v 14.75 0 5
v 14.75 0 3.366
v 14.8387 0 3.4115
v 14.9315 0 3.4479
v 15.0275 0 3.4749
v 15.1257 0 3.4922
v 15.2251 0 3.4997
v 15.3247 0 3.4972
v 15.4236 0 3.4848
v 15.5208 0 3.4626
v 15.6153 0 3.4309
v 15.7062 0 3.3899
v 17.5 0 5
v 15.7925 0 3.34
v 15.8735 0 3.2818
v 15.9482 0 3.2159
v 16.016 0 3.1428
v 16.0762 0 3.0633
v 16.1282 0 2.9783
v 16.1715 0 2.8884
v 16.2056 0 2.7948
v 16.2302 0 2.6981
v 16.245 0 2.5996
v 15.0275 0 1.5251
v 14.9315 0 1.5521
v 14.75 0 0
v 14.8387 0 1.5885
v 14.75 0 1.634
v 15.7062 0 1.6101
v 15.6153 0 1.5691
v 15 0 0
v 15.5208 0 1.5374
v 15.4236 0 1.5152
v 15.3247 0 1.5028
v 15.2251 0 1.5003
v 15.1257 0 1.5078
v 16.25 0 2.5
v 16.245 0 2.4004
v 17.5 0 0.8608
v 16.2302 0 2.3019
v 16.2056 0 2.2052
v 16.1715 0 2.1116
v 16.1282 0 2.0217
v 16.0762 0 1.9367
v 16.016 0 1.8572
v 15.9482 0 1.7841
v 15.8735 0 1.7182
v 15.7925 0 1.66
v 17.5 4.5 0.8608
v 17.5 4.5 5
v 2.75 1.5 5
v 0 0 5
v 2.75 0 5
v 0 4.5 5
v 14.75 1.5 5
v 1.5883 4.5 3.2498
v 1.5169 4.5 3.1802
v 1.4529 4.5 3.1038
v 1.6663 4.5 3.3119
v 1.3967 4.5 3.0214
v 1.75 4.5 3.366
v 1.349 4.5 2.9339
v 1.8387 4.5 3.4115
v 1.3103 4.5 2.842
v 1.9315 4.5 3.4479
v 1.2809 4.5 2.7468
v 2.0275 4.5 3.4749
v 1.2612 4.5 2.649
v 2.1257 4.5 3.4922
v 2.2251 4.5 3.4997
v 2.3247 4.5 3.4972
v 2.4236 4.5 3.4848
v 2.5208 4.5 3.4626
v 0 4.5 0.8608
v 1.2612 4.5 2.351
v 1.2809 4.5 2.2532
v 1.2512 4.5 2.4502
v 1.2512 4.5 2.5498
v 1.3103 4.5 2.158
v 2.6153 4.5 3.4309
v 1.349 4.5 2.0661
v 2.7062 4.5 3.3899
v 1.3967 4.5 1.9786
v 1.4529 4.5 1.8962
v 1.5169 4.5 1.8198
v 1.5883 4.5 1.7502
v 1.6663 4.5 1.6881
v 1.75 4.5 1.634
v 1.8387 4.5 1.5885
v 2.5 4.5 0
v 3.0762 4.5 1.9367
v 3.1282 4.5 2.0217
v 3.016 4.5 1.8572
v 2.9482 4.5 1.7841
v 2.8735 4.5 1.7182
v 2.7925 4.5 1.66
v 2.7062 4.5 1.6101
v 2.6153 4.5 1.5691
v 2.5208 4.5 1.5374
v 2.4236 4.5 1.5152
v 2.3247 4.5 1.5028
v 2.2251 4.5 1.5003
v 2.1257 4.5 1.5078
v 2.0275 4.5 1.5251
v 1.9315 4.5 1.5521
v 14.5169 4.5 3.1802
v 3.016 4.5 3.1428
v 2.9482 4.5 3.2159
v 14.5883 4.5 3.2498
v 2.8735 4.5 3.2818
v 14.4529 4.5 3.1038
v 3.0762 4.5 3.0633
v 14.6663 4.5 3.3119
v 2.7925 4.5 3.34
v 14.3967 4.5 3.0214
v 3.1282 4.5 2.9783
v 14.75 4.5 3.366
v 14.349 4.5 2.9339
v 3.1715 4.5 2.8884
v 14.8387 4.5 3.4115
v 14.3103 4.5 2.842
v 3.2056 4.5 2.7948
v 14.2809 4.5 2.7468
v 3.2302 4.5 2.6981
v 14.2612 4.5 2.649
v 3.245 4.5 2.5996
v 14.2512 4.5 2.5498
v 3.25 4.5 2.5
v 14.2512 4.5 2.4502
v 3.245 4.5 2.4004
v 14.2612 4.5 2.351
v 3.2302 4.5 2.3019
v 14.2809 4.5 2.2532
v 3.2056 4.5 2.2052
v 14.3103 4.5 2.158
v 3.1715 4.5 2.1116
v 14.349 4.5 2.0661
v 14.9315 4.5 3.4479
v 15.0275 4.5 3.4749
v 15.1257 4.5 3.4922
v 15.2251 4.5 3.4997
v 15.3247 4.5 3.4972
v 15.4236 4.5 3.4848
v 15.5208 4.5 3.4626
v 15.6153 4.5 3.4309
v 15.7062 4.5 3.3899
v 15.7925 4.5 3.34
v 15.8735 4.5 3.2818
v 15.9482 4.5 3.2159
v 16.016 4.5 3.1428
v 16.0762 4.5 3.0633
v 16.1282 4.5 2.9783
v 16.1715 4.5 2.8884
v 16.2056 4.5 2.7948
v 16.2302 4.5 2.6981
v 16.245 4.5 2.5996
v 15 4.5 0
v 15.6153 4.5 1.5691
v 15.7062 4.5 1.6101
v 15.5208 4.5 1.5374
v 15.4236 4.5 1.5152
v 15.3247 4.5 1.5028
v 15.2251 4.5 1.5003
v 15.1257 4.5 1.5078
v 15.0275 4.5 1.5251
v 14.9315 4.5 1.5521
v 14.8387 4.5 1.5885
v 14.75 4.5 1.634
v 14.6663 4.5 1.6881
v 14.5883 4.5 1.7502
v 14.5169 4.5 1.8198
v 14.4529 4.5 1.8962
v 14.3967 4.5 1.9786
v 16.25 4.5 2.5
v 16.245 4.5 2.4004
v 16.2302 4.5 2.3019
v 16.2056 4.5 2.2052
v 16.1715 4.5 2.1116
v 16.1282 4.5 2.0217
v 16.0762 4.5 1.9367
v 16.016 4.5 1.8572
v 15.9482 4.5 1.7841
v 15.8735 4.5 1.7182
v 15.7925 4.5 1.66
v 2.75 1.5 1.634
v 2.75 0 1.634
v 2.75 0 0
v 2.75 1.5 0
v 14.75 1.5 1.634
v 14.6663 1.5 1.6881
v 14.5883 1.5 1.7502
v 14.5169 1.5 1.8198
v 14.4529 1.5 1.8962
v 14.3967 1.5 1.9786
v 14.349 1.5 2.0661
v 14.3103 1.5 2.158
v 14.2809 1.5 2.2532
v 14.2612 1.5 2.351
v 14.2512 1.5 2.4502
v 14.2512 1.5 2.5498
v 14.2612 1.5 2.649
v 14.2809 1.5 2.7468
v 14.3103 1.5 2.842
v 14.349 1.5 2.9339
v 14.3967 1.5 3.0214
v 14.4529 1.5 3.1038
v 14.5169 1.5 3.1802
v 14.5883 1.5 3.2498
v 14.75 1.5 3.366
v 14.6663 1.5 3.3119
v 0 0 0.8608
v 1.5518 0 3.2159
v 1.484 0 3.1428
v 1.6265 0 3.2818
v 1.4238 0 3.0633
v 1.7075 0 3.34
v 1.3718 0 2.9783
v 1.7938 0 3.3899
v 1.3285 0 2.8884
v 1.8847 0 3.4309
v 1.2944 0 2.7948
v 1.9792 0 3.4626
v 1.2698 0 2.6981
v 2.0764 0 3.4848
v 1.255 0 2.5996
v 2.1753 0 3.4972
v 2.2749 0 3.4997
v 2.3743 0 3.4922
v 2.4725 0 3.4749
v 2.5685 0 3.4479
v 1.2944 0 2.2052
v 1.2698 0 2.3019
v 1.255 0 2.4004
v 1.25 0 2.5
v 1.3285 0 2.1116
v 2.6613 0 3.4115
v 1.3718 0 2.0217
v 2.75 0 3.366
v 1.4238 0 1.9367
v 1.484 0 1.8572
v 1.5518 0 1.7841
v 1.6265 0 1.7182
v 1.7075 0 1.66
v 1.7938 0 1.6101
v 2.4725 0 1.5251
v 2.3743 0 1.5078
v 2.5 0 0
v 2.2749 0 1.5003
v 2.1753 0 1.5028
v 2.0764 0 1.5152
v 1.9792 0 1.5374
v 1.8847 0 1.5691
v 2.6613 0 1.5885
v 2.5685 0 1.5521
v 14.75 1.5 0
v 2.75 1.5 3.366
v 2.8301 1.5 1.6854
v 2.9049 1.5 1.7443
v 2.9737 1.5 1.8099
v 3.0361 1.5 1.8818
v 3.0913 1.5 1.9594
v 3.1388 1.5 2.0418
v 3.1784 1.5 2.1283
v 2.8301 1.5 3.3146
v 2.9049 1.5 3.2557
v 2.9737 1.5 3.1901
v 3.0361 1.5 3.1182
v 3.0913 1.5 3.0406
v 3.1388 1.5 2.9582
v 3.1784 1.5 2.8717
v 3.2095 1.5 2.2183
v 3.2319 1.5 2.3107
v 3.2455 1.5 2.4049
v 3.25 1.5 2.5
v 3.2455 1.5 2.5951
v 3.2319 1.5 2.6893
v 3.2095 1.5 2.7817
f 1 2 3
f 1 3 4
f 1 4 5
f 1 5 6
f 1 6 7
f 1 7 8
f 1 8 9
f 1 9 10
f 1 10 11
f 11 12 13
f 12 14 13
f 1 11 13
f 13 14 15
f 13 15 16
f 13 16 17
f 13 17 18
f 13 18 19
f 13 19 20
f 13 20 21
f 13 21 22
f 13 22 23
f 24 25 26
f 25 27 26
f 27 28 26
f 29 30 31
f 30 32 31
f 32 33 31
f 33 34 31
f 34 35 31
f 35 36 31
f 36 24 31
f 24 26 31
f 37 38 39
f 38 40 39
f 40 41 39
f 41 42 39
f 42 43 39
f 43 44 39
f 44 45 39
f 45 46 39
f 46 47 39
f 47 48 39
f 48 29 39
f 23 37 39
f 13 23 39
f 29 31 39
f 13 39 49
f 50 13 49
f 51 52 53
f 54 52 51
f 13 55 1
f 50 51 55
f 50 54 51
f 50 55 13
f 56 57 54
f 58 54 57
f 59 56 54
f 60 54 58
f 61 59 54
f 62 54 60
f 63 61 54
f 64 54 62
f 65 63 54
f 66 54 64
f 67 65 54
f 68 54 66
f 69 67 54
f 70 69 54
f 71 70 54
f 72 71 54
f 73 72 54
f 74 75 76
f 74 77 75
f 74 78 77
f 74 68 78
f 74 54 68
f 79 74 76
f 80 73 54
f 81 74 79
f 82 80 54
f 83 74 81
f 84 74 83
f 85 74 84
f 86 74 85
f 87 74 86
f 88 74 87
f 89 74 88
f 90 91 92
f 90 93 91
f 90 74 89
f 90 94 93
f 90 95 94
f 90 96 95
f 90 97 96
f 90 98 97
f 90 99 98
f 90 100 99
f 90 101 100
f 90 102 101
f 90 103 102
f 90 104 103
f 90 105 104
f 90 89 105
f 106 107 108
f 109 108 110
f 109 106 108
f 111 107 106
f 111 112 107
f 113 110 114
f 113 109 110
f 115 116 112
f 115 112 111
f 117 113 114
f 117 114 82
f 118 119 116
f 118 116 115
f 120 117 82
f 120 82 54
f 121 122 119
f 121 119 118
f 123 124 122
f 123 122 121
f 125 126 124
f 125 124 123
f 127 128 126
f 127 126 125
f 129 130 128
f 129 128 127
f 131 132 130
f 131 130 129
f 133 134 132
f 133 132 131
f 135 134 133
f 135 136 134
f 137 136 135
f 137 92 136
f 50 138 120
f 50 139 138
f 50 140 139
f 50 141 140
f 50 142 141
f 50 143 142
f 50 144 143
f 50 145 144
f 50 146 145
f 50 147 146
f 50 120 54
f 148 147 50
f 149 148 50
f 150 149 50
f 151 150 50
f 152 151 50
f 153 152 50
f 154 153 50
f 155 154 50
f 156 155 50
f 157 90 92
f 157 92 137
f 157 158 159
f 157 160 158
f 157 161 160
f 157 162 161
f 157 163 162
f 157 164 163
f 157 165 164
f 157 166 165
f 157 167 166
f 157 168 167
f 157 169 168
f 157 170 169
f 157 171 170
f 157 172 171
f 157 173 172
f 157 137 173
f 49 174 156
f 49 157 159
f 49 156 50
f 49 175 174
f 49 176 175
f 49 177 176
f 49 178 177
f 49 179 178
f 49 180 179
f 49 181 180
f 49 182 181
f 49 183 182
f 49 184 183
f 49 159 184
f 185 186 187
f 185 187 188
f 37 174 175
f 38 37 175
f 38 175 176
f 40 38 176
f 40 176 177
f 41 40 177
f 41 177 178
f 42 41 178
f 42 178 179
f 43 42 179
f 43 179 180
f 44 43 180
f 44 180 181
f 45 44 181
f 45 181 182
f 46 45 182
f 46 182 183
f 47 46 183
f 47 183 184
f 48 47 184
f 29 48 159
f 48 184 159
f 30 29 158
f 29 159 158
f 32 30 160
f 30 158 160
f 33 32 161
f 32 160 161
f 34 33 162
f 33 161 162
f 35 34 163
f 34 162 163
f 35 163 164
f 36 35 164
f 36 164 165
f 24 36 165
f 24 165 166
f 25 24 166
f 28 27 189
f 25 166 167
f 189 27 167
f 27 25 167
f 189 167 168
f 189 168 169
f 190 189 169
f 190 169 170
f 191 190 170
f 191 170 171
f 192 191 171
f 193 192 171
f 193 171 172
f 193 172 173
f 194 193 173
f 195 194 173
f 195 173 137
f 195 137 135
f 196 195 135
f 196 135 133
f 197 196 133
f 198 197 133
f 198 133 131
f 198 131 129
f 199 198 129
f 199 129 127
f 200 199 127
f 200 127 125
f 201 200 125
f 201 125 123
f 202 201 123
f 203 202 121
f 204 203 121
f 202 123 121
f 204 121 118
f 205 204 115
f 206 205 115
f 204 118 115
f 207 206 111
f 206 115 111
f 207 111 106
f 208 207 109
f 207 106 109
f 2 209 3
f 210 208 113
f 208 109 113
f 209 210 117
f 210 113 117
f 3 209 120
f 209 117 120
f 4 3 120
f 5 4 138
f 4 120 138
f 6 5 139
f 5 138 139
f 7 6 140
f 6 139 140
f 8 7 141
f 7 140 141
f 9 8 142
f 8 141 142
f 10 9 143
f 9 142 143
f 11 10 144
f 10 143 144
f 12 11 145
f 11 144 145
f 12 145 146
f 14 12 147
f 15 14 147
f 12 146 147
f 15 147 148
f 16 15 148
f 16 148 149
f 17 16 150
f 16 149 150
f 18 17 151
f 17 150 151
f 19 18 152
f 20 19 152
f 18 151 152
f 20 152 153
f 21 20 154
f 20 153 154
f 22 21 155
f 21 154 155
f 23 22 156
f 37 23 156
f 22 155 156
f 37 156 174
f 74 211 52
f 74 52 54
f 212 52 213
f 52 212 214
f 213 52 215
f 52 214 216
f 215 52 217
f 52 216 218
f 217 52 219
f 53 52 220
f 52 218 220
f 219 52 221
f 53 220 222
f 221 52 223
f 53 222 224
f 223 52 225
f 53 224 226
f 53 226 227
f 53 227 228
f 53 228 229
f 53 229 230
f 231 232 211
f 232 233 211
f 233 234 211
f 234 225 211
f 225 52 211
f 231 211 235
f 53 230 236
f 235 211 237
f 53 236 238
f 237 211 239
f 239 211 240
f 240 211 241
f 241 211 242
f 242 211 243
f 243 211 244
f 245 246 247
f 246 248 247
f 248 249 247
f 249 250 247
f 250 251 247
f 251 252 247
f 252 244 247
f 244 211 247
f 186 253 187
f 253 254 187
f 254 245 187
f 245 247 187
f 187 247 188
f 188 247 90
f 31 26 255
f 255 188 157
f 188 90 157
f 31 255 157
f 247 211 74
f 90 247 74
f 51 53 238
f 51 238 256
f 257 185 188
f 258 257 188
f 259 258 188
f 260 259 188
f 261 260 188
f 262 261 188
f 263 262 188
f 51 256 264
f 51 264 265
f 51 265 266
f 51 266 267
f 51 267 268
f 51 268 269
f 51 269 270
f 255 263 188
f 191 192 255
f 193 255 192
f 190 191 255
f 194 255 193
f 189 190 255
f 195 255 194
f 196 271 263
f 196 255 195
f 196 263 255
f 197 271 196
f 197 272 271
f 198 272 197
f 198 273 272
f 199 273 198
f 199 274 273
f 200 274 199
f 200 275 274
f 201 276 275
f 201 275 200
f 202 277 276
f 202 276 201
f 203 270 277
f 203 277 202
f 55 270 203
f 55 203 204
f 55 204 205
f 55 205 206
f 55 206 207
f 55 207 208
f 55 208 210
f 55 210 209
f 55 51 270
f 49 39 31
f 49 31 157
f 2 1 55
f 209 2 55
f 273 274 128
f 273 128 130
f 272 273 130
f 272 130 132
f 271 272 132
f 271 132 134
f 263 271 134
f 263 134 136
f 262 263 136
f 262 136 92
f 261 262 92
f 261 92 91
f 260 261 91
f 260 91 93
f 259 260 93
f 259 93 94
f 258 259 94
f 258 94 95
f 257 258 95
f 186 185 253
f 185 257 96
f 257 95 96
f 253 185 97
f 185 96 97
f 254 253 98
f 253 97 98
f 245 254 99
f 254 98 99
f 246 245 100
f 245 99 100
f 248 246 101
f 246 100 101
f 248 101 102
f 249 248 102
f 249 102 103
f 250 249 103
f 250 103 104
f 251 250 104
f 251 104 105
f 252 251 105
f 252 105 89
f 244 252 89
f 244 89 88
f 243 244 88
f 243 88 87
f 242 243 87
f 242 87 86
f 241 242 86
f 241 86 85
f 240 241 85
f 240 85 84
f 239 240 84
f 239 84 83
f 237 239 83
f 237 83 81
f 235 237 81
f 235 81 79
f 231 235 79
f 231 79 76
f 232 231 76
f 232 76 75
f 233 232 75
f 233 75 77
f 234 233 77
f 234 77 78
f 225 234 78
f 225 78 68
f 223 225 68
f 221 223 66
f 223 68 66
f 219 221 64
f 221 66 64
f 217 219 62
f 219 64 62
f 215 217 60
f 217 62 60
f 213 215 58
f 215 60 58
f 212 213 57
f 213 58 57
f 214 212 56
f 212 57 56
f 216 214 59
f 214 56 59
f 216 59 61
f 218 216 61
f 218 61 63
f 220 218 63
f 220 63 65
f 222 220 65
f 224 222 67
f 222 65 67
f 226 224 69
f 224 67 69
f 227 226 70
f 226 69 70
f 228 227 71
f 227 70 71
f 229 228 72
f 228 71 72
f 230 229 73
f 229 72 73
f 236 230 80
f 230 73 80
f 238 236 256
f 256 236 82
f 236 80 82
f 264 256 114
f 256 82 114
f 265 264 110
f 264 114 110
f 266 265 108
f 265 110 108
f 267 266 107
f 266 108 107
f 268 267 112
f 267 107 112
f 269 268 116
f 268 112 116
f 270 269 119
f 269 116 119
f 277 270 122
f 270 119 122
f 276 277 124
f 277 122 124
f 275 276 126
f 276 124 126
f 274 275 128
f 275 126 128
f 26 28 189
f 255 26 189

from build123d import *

# Parameters (mm, degrees)
SKETCH_1_W          = 17.5
SKETCH_1_H          = 4.5
EXTRUDE_1_DEPTH     = 5
SKETCH_2_R          = 1
CUT_EXTRUDE_1_DEPTH = 5.5
SKETCH_3_W          = 12
SKETCH_3_H          = 1.5
CUT_EXTRUDE_3_DEPTH = 6
CHAMFER_2_SIZE      = 2.5
CHAMFER_2_SIZE2     = 0.860819033


with BuildPart() as part:
    # Эскиз1 → Бобышка-Вытянуть1 (new body)
    with BuildSketch(Plane.XY):
        with Locations((8.75, 2.25)):
            Rectangle(SKETCH_1_W, SKETCH_1_H)
    extrude(amount=EXTRUDE_1_DEPTH)

    # Эскиз2 → Вырез-Вытянуть1 (cut, through all)
    with BuildSketch(Plane(origin=(0, 4.5, 0), x_dir=(1, 0, 0), z_dir=(0, 1, 0))):
        with Locations((2.25, -2.5)):
            Circle(SKETCH_2_R)
        with Locations((15.25, -2.5)):
            Circle(SKETCH_2_R)
    extrude(amount=-CUT_EXTRUDE_1_DEPTH, mode=Mode.SUBTRACT)

    # Эскиз3 → Вырез-Вытянуть3 (cut, through all)
    with BuildSketch(Plane.XY.offset(5)):
        with Locations((8.75, 0.75)):
            Rectangle(SKETCH_3_W, SKETCH_3_H)
    extrude(amount=-CUT_EXTRUDE_3_DEPTH, mode=Mode.SUBTRACT)

    # Фаска2
    chamfer_2_edges = [part.edges().sort_by_distance(p)[0] for p in [
        (17.5, 2.25, 0),
        (0, 2.25, 0),
    ]]
    chamfer_2_side = [part.faces().sort_by_distance(p)[0] for p in [
        (8.75, 2.694444444, 0),
    ]]
    chamfer(chamfer_2_edges, length=CHAMFER_2_SIZE, length2=CHAMFER_2_SIZE2, reference=chamfer_2_side[0])


solid = part.part
